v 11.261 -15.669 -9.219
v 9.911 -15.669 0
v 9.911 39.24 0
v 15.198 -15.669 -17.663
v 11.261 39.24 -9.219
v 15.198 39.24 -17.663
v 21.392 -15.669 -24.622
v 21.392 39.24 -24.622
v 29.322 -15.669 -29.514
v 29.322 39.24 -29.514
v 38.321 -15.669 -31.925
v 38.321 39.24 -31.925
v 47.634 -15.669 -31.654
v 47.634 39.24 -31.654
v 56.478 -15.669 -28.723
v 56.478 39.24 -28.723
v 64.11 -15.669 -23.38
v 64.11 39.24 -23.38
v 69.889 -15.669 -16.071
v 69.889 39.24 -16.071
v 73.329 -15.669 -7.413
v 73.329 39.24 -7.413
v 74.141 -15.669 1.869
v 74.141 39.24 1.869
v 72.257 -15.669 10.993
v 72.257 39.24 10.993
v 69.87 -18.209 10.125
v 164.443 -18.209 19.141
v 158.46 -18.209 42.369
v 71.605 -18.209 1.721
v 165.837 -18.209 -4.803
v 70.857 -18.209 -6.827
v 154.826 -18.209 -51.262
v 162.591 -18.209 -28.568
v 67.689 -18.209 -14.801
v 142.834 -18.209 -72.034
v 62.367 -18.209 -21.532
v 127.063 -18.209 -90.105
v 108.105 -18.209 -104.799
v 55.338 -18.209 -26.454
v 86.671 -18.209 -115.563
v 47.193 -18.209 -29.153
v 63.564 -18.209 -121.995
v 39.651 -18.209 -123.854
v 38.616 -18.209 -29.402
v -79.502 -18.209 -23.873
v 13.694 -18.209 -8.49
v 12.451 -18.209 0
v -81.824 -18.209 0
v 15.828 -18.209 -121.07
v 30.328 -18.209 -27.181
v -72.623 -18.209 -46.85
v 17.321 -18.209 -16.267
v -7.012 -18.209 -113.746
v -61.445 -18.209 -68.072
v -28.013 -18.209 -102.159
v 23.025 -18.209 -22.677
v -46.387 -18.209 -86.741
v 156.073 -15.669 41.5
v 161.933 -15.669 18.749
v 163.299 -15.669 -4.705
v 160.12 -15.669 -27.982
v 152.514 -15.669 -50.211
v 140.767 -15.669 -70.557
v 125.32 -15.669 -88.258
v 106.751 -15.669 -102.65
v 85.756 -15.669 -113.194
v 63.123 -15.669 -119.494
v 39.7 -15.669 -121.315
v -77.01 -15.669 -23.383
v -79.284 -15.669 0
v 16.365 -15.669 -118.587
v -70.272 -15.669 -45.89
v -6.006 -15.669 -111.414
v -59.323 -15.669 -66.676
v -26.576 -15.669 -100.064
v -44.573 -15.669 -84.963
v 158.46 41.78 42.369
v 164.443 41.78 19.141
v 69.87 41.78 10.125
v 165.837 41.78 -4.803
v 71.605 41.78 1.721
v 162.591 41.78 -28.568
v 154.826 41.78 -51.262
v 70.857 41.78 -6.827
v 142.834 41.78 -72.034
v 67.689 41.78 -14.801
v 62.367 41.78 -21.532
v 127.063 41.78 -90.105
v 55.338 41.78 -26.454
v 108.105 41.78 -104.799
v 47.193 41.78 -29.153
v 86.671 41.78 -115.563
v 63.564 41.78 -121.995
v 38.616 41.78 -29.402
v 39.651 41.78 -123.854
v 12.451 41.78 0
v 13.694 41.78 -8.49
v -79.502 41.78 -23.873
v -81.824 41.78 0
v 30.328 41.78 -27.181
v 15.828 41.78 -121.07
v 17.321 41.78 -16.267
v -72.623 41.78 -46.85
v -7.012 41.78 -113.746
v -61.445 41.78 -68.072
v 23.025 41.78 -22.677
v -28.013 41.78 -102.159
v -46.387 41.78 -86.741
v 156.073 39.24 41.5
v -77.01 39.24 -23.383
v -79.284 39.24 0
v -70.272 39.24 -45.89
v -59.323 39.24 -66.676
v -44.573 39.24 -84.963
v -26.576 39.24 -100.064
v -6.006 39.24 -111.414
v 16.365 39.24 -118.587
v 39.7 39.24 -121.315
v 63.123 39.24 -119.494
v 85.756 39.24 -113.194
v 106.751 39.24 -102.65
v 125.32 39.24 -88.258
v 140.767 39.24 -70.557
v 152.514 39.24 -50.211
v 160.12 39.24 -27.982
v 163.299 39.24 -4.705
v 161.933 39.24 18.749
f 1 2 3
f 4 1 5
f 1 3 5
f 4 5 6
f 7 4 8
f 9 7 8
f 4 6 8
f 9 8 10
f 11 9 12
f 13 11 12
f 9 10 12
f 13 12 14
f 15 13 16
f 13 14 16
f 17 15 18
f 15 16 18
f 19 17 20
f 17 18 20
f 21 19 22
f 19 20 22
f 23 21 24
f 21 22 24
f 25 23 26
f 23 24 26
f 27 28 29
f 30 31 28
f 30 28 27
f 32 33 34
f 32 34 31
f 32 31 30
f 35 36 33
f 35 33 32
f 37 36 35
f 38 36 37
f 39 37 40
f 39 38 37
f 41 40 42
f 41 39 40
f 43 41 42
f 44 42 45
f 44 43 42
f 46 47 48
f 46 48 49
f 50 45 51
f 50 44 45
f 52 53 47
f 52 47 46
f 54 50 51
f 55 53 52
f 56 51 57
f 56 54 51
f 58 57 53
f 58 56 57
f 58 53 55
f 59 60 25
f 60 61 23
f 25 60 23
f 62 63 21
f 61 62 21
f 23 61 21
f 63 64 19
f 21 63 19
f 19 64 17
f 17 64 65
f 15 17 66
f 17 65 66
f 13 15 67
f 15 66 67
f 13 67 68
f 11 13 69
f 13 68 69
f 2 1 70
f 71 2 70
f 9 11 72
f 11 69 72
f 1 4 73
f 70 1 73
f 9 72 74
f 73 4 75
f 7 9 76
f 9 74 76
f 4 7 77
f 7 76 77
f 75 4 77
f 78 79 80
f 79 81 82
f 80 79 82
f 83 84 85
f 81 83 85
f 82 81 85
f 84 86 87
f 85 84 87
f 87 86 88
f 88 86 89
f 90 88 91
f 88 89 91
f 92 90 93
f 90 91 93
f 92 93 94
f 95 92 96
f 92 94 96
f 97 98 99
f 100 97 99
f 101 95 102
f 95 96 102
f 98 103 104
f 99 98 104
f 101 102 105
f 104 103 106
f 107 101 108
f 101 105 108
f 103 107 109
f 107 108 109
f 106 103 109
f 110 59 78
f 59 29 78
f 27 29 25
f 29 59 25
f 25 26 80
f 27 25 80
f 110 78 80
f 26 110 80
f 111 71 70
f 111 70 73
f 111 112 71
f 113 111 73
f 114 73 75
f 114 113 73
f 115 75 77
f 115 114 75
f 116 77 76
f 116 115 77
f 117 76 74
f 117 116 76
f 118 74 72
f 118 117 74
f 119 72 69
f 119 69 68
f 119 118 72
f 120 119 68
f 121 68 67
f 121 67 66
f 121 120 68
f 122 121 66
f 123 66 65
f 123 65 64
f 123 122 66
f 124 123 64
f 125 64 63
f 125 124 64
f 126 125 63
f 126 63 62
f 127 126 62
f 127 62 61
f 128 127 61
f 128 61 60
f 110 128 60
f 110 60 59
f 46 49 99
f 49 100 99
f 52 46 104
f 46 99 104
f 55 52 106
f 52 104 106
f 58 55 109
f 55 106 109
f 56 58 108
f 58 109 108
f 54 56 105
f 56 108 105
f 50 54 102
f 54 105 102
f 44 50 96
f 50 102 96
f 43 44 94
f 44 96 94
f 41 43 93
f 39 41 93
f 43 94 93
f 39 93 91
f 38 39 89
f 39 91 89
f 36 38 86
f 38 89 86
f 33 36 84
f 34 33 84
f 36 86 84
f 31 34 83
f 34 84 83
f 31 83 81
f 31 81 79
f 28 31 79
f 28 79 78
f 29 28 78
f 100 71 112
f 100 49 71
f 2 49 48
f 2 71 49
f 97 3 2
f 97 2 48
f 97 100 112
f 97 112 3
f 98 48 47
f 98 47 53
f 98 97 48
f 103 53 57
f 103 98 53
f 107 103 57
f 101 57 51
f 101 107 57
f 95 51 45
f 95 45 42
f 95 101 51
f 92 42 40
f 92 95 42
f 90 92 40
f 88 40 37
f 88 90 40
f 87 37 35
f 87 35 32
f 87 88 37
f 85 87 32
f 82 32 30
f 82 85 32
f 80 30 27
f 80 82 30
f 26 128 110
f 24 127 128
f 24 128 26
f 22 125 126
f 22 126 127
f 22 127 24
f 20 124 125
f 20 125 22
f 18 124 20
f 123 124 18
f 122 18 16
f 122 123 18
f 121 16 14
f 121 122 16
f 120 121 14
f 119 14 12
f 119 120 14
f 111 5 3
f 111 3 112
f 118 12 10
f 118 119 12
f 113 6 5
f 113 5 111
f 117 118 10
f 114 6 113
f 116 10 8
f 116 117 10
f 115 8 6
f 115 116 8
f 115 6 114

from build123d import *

# Parameters (mm, degrees)
SKETCH2_W           = 94.275056846
SKETCH2_H           = 59.98986983
SKETCH2_W_2         = 89.195056846
SKETCH2_H_2         = 54.90986983
REVOLVE_THIN1_ANGLE = 200


with BuildPart() as part:
    # Sketch2 → Revolve-Thin1 (revolve)
    with BuildSketch(Plane.XY):
        with Locations((-34.686966551, 11.785533037)):
            Rectangle(SKETCH2_W, SKETCH2_H)
        with Locations((-34.686966551, 11.785533037)):
            Rectangle(SKETCH2_W_2, SKETCH2_H_2, mode=Mode.SUBTRACT)
    revolve(axis=Axis((42.052924699, 43.793969352, 0), (0, -1, 0)), revolution_arc=REVOLVE_THIN1_ANGLE)


solid = part.part
